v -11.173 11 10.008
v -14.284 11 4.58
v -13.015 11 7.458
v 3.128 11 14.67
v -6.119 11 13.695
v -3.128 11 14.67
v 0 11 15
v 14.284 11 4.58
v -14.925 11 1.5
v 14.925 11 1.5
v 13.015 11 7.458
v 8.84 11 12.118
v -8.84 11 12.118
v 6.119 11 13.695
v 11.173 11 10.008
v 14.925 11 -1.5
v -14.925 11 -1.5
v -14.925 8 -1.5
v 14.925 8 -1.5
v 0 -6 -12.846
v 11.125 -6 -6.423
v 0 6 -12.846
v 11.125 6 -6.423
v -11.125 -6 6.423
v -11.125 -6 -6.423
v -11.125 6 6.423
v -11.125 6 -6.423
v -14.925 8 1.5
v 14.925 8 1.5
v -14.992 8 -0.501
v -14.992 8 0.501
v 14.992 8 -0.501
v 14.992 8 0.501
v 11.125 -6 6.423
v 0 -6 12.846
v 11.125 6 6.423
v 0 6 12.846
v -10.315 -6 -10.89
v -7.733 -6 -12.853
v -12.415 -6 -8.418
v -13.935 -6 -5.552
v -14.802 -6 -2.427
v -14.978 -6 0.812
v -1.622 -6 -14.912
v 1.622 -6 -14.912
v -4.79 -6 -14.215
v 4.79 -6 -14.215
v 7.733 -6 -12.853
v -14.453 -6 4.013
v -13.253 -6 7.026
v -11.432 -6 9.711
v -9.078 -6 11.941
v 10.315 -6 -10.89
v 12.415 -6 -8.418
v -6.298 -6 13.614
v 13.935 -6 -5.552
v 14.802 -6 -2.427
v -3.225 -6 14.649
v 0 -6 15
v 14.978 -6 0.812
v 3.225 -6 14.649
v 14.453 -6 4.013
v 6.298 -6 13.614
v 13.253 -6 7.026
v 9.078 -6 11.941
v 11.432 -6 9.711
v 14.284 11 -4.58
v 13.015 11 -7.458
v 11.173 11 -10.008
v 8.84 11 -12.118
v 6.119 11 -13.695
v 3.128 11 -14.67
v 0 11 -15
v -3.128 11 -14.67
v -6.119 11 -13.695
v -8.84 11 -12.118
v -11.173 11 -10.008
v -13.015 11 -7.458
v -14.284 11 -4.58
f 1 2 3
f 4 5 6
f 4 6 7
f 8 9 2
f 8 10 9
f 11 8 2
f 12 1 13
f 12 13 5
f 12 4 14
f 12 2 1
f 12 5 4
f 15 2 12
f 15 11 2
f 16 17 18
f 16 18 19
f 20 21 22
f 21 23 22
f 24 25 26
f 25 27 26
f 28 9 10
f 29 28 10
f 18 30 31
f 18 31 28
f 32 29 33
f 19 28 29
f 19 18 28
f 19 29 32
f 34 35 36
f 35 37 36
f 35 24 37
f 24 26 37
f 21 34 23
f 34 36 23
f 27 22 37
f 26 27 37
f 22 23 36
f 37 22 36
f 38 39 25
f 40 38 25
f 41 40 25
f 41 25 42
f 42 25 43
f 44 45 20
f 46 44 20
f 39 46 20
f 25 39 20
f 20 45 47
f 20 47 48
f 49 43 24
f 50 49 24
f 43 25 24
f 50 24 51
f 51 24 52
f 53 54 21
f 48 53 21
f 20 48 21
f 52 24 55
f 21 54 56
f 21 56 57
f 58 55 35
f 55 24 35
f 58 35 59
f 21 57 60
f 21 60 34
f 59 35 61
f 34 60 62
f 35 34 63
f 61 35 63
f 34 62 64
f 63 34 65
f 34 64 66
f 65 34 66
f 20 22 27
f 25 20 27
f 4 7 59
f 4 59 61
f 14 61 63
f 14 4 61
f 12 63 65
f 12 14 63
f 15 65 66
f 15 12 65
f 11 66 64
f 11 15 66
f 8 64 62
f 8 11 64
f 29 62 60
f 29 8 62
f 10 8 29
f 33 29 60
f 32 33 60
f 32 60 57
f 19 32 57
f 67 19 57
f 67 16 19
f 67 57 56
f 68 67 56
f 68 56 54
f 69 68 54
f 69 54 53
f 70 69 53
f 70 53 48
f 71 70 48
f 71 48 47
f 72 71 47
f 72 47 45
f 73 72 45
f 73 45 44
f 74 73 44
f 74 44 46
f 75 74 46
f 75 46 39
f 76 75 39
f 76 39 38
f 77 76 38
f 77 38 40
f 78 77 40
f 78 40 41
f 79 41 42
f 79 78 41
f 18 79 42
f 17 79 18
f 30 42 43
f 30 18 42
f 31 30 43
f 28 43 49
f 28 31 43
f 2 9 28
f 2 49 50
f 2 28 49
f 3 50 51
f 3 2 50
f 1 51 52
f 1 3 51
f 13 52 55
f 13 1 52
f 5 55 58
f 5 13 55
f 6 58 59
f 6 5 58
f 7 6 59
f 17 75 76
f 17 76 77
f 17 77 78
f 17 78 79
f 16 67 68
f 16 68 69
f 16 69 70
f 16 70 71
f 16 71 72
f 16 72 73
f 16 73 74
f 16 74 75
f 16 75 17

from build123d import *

# Parameters (mm, degrees)
SKETCH2_R           = 15
BOSS_EXTRUDE1_DEPTH = 6
BOSS_EXTRUDE2_START = 5
SKETCH3_R           = 15
BOSS_EXTRUDE2_DEPTH = 5
SKETCH4_W           = 32
SKETCH4_H           = 3
CUT_EXTRUDE1_DEPTH  = 3


with BuildPart() as part:
    # Sketch2 → Boss-Extrude1 (new, symmetric)
    with BuildSketch(Plane(origin=(0, 0, 0), x_dir=(1, 0, 0), z_dir=(0, 1, 0))):
        with Locations(Location((0, 0, 0), (0, 0, 270))):
            Circle(SKETCH2_R)
        Polygon((0, 12.846043489), (-11.125, 6.423021745), (-11.125, -6.423021745), (0, -12.846043489), (11.125, -6.423021745), (11.125, 6.423021745), align=None, mode=Mode.SUBTRACT)
    extrude(amount=BOSS_EXTRUDE1_DEPTH, both=True)

    # Sketch3 → Boss-Extrude2 (add)
    with BuildSketch(Plane(origin=(0, 6, 0), x_dir=(1, 0, 0), z_dir=(0, 1, 0)).offset(BOSS_EXTRUDE2_START)):
        with Locations(Location((0, 0, 0), (0, 0, 270))):
            Circle(SKETCH3_R)
    extrude(amount=-BOSS_EXTRUDE2_DEPTH)

    # Sketch4 → Cut-Extrude1 (cut)
    with BuildSketch(Plane(origin=(0, 11, 0), x_dir=(1, 0, 0), z_dir=(0, 1, 0))):
        Rectangle(SKETCH4_W, SKETCH4_H)
    extrude(amount=-CUT_EXTRUDE1_DEPTH, mode=Mode.SUBTRACT)


solid = part.part
